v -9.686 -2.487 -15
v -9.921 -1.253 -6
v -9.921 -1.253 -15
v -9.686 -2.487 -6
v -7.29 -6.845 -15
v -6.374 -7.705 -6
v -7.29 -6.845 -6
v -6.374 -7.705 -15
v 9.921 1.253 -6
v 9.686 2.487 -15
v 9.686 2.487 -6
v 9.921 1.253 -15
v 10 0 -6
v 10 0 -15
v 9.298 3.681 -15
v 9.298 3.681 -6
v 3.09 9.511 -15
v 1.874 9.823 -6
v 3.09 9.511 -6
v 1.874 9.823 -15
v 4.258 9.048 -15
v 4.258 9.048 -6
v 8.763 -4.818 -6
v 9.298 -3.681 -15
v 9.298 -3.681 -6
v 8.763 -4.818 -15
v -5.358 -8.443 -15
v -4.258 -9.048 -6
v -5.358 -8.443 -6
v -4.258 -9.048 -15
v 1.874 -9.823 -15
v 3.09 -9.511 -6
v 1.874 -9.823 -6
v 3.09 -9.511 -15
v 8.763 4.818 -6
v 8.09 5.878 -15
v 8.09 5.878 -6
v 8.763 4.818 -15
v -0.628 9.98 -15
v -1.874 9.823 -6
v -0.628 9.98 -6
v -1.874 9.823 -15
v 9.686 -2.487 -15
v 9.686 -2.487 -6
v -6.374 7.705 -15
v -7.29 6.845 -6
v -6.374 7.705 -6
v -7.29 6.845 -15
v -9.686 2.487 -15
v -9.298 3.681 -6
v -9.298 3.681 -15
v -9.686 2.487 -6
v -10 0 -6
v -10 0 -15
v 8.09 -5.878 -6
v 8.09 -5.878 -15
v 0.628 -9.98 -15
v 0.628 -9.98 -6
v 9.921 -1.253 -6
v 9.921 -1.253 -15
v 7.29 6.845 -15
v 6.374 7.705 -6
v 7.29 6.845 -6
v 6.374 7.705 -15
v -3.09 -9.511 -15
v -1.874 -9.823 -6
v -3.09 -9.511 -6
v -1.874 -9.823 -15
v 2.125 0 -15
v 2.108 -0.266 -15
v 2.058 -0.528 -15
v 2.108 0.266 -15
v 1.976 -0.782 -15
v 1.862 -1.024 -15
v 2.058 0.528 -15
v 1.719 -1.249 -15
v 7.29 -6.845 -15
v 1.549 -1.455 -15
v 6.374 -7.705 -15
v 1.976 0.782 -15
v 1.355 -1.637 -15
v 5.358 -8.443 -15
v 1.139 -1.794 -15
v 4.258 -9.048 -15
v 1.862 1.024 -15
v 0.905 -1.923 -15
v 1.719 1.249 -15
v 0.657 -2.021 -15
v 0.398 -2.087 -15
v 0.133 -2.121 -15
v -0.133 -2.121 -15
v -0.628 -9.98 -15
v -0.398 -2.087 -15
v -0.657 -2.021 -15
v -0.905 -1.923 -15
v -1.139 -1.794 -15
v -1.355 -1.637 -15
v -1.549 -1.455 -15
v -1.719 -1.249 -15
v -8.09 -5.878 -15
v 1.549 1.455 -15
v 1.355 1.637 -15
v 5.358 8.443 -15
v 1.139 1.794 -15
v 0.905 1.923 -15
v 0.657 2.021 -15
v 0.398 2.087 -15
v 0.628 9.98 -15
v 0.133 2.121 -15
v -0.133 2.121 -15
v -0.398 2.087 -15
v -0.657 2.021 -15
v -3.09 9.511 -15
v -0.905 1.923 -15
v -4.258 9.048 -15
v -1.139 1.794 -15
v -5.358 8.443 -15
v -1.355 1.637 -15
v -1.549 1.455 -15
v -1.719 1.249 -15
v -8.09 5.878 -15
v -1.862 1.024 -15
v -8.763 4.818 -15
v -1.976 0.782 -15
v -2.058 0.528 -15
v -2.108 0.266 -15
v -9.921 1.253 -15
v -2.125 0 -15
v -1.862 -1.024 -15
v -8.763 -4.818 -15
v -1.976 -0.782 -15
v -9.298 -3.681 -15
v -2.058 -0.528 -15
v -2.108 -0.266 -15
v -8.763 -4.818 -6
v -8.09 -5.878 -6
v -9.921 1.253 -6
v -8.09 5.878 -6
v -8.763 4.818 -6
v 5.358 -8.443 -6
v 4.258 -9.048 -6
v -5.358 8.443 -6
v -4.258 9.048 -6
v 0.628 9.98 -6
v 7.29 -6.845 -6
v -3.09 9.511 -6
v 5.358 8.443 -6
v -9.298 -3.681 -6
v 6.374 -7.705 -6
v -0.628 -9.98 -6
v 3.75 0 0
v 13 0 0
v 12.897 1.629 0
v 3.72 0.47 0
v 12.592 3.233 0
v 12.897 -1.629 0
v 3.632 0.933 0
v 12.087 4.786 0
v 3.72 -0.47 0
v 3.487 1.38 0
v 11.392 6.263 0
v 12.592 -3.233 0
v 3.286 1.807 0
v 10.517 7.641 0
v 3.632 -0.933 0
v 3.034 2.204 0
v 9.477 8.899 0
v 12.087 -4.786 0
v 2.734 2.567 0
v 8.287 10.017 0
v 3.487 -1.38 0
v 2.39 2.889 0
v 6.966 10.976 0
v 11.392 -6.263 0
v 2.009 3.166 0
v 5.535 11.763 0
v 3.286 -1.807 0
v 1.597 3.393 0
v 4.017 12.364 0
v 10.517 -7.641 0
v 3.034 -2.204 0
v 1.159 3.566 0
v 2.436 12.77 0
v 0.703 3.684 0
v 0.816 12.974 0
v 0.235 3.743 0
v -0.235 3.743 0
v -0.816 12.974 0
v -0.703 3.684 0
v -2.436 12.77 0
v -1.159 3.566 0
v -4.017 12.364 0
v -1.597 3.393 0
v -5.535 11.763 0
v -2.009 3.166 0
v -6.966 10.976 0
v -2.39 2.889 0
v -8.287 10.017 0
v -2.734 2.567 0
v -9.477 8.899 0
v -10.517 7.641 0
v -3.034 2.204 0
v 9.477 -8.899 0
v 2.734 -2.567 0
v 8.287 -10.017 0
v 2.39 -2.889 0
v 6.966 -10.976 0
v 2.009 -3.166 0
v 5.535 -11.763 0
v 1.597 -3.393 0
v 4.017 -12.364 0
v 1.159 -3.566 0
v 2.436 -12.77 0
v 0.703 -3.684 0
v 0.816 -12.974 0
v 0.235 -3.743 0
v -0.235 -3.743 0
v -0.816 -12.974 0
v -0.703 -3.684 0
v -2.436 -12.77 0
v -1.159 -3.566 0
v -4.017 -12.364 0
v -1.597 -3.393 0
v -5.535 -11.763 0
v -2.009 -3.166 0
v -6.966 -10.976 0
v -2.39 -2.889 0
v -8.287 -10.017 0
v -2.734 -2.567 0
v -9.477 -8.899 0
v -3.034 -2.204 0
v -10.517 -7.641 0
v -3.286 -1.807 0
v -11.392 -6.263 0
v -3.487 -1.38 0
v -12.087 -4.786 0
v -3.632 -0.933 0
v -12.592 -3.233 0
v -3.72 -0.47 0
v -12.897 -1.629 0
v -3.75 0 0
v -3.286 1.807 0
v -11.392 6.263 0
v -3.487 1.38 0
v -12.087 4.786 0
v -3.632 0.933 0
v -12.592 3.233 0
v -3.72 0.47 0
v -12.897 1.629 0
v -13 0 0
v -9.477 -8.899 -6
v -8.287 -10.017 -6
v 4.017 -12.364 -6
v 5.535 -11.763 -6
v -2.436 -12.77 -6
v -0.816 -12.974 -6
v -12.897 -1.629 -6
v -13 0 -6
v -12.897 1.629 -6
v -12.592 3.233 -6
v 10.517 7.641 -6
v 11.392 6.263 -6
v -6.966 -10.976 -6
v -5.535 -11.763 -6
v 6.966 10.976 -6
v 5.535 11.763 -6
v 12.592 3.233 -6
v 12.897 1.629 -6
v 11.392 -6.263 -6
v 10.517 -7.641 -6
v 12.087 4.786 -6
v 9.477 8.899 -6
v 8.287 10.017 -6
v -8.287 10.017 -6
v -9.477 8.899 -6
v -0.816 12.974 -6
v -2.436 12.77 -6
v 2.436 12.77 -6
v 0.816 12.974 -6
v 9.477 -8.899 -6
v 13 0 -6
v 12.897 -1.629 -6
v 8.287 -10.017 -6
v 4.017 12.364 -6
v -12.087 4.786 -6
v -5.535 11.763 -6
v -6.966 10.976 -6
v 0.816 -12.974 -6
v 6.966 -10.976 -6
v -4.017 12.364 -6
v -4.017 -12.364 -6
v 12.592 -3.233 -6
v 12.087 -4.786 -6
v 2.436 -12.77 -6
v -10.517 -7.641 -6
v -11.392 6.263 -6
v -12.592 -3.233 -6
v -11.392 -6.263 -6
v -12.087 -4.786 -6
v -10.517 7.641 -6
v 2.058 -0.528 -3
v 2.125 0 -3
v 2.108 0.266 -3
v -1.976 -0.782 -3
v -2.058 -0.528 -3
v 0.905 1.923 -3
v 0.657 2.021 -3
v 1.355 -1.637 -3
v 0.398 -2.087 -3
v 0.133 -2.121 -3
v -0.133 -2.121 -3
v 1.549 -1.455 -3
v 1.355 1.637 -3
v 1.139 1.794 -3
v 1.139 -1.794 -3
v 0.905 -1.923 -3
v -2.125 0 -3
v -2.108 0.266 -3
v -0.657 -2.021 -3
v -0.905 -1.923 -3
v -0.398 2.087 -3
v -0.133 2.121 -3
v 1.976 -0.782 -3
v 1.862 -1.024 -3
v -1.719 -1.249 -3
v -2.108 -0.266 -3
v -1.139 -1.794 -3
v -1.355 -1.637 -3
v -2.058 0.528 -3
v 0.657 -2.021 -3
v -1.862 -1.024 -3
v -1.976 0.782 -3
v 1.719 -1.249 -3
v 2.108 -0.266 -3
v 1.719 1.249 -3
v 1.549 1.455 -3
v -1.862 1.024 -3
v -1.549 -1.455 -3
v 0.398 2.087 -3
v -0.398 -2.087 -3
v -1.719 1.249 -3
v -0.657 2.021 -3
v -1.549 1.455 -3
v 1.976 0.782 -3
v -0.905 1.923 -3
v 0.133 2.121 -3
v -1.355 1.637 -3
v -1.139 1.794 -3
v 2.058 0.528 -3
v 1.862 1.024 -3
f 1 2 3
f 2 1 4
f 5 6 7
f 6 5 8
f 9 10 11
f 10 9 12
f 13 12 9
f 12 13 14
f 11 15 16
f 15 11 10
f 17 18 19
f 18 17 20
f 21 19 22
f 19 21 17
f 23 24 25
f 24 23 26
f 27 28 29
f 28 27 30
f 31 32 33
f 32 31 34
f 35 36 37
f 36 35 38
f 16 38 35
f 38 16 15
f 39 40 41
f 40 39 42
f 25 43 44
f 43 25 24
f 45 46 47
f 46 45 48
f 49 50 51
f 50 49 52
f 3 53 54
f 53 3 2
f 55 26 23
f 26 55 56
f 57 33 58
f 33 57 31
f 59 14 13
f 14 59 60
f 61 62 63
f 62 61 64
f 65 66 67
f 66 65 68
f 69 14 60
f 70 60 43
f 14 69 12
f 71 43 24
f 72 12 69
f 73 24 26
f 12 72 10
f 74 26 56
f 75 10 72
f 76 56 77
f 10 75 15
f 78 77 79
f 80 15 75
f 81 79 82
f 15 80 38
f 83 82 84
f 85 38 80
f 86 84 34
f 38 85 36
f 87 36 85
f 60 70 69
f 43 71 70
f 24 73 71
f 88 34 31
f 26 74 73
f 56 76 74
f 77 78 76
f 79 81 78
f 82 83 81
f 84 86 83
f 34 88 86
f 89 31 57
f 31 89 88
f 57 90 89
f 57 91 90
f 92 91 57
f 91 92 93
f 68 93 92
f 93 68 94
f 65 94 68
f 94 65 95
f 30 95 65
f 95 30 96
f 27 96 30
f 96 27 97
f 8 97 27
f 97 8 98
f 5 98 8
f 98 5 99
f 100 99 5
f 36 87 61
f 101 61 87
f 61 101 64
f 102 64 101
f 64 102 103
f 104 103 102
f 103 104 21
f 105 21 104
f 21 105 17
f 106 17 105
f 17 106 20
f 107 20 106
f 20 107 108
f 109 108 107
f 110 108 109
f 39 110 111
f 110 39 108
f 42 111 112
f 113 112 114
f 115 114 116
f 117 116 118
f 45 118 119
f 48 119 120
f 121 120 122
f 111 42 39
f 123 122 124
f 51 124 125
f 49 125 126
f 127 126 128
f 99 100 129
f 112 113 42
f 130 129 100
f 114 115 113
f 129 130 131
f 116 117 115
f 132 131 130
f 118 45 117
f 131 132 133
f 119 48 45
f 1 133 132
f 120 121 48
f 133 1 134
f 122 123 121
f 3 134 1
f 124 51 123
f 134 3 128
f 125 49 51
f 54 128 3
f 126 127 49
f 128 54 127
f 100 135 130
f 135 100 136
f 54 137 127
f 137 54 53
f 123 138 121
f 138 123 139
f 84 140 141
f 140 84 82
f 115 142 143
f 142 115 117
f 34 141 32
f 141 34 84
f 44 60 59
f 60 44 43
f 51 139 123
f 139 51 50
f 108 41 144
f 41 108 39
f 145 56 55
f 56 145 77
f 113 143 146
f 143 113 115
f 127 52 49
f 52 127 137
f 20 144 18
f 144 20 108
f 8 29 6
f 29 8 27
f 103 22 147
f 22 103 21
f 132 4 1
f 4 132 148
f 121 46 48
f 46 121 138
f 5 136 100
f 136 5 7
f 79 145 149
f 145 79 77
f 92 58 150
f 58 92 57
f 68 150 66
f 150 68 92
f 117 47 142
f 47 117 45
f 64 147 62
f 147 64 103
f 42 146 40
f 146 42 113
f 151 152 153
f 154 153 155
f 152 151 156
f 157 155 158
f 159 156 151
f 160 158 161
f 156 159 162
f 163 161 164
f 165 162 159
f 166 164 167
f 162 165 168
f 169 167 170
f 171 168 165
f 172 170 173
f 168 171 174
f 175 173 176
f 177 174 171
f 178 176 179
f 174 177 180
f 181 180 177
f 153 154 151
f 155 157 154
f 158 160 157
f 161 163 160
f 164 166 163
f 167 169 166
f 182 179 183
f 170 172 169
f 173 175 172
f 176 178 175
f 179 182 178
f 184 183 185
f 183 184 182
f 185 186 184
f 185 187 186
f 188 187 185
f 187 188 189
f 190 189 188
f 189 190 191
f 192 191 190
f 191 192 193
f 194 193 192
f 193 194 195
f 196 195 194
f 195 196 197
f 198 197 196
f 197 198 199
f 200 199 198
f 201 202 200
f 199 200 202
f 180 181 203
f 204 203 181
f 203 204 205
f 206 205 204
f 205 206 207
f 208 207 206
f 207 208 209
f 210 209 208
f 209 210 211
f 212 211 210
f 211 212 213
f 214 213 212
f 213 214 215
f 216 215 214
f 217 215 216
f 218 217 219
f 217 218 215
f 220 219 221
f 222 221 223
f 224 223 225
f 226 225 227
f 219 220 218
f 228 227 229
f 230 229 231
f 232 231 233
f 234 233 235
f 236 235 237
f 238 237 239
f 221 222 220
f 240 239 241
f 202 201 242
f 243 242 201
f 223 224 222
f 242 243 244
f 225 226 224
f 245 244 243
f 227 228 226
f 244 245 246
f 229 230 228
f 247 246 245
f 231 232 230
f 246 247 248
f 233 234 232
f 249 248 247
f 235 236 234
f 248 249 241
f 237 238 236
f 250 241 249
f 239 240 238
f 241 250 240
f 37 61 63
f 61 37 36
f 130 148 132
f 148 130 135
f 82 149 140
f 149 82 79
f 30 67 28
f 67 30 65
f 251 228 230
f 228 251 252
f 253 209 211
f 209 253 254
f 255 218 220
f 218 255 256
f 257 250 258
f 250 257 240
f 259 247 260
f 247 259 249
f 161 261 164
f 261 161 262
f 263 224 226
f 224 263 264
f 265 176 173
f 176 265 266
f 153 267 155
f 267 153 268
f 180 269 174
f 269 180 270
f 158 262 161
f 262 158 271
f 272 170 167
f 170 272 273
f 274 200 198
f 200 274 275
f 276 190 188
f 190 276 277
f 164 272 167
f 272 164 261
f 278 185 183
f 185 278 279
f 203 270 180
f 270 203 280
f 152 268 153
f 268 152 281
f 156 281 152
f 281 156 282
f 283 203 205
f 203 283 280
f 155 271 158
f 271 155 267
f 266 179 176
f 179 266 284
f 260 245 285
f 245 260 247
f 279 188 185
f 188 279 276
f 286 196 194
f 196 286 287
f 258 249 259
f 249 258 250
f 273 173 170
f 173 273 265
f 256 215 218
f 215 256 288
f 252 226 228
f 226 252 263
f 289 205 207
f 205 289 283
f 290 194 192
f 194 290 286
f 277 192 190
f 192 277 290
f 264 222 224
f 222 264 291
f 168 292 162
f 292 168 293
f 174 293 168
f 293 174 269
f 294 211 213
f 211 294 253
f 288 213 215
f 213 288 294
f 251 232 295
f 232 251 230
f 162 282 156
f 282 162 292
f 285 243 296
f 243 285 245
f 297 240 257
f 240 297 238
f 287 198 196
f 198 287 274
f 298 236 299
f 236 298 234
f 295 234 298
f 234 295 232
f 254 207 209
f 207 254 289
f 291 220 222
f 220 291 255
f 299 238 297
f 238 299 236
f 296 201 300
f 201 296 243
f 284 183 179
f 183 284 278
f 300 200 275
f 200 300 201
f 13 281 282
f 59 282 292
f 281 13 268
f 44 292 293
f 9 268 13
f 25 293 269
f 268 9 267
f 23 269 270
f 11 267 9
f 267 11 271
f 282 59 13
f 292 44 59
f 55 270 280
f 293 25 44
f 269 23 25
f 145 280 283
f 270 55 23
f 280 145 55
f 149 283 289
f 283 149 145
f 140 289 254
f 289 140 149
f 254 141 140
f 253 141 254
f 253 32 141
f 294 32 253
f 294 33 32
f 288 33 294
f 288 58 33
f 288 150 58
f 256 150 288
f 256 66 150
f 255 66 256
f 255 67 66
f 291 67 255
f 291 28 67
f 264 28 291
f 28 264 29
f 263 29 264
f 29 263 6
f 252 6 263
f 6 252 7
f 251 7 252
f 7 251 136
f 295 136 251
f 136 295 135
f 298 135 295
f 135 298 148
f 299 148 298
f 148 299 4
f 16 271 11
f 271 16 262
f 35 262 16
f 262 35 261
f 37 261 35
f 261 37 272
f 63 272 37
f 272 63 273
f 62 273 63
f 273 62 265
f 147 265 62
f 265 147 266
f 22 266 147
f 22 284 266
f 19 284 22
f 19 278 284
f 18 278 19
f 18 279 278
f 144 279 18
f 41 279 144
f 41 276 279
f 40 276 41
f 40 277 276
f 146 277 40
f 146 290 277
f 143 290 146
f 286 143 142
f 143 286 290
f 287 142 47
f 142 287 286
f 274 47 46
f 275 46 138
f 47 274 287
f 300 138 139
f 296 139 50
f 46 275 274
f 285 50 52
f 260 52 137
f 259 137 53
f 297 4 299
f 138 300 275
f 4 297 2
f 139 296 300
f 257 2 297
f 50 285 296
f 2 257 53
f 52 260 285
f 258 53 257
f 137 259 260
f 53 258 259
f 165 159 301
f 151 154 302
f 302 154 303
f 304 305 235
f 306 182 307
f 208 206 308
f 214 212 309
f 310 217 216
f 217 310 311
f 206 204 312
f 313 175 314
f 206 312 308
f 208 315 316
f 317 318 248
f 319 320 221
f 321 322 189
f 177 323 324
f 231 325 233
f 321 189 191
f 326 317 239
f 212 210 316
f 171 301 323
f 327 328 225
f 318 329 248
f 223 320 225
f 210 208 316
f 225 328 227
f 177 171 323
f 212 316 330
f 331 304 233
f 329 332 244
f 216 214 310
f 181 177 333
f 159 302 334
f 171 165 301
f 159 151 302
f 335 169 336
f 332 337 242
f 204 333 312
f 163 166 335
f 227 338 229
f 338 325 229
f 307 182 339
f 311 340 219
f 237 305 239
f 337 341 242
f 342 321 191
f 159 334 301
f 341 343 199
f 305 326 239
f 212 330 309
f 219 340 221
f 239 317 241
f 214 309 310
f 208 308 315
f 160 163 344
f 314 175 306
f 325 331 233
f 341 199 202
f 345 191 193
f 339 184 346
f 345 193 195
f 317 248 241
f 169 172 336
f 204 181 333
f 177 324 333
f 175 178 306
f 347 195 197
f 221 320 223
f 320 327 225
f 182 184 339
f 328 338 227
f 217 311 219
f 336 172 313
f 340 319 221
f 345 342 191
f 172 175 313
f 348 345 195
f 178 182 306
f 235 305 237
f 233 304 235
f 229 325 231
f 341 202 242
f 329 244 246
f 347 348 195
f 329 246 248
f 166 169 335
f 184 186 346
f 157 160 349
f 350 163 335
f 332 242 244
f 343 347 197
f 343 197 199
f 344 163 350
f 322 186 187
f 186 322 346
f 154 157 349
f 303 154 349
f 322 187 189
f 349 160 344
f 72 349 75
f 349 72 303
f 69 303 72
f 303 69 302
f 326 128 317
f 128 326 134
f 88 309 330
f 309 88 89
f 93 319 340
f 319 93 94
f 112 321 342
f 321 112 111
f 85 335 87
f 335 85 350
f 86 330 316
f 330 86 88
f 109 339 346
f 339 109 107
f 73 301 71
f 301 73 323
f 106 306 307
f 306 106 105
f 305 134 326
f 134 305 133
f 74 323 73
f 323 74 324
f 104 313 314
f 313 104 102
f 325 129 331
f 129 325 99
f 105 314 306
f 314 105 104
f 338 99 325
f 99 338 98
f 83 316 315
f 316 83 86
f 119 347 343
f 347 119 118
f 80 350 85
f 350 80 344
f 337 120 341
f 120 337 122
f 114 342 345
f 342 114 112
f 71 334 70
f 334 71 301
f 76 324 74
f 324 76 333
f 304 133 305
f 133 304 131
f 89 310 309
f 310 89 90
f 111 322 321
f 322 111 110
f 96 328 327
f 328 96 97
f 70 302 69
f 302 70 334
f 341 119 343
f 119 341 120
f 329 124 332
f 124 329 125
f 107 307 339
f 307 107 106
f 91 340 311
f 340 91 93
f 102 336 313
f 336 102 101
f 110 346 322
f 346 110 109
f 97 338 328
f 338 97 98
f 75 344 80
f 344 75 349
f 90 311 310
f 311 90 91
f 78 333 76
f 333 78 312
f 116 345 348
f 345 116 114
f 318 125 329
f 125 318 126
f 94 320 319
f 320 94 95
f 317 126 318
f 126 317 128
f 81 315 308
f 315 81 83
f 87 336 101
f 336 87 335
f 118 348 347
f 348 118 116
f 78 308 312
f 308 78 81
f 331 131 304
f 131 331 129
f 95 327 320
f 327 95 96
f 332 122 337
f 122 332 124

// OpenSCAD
$fn = 50;


difference() {
	union() {
		translate(v = [0, 0, -15.0000000000]) {
			cylinder(h = 15, r = 10.0000000000);
		}
		translate(v = [0, 0, -6.0000000000]) {
			cylinder(h = 6, r = 13.0000000000);
		}
	}
	union() {
		translate(v = [0, 0, 0]) {
			rotate(a = [0, 0, 0]) {
				difference() {
					union() {
						#translate(v = [0, 0, -15.0000000000]) {
							cylinder(h = 15, r = 2.0000000000);
						}
						#translate(v = [0, 0, -3]) {
							cylinder(h = 3, r1 = 2.1250000000, r2 = 3.7500000000);
						}
						#translate(v = [0, 0, -15.0000000000]) {
							cylinder(h = 15, r = 2.1250000000);
						}
						#translate(v = [0, 0, -15.0000000000]) {
							cylinder(h = 15, r = 2.0000000000);
						}
					}
					union();
				}
			}
		}
	}
}
